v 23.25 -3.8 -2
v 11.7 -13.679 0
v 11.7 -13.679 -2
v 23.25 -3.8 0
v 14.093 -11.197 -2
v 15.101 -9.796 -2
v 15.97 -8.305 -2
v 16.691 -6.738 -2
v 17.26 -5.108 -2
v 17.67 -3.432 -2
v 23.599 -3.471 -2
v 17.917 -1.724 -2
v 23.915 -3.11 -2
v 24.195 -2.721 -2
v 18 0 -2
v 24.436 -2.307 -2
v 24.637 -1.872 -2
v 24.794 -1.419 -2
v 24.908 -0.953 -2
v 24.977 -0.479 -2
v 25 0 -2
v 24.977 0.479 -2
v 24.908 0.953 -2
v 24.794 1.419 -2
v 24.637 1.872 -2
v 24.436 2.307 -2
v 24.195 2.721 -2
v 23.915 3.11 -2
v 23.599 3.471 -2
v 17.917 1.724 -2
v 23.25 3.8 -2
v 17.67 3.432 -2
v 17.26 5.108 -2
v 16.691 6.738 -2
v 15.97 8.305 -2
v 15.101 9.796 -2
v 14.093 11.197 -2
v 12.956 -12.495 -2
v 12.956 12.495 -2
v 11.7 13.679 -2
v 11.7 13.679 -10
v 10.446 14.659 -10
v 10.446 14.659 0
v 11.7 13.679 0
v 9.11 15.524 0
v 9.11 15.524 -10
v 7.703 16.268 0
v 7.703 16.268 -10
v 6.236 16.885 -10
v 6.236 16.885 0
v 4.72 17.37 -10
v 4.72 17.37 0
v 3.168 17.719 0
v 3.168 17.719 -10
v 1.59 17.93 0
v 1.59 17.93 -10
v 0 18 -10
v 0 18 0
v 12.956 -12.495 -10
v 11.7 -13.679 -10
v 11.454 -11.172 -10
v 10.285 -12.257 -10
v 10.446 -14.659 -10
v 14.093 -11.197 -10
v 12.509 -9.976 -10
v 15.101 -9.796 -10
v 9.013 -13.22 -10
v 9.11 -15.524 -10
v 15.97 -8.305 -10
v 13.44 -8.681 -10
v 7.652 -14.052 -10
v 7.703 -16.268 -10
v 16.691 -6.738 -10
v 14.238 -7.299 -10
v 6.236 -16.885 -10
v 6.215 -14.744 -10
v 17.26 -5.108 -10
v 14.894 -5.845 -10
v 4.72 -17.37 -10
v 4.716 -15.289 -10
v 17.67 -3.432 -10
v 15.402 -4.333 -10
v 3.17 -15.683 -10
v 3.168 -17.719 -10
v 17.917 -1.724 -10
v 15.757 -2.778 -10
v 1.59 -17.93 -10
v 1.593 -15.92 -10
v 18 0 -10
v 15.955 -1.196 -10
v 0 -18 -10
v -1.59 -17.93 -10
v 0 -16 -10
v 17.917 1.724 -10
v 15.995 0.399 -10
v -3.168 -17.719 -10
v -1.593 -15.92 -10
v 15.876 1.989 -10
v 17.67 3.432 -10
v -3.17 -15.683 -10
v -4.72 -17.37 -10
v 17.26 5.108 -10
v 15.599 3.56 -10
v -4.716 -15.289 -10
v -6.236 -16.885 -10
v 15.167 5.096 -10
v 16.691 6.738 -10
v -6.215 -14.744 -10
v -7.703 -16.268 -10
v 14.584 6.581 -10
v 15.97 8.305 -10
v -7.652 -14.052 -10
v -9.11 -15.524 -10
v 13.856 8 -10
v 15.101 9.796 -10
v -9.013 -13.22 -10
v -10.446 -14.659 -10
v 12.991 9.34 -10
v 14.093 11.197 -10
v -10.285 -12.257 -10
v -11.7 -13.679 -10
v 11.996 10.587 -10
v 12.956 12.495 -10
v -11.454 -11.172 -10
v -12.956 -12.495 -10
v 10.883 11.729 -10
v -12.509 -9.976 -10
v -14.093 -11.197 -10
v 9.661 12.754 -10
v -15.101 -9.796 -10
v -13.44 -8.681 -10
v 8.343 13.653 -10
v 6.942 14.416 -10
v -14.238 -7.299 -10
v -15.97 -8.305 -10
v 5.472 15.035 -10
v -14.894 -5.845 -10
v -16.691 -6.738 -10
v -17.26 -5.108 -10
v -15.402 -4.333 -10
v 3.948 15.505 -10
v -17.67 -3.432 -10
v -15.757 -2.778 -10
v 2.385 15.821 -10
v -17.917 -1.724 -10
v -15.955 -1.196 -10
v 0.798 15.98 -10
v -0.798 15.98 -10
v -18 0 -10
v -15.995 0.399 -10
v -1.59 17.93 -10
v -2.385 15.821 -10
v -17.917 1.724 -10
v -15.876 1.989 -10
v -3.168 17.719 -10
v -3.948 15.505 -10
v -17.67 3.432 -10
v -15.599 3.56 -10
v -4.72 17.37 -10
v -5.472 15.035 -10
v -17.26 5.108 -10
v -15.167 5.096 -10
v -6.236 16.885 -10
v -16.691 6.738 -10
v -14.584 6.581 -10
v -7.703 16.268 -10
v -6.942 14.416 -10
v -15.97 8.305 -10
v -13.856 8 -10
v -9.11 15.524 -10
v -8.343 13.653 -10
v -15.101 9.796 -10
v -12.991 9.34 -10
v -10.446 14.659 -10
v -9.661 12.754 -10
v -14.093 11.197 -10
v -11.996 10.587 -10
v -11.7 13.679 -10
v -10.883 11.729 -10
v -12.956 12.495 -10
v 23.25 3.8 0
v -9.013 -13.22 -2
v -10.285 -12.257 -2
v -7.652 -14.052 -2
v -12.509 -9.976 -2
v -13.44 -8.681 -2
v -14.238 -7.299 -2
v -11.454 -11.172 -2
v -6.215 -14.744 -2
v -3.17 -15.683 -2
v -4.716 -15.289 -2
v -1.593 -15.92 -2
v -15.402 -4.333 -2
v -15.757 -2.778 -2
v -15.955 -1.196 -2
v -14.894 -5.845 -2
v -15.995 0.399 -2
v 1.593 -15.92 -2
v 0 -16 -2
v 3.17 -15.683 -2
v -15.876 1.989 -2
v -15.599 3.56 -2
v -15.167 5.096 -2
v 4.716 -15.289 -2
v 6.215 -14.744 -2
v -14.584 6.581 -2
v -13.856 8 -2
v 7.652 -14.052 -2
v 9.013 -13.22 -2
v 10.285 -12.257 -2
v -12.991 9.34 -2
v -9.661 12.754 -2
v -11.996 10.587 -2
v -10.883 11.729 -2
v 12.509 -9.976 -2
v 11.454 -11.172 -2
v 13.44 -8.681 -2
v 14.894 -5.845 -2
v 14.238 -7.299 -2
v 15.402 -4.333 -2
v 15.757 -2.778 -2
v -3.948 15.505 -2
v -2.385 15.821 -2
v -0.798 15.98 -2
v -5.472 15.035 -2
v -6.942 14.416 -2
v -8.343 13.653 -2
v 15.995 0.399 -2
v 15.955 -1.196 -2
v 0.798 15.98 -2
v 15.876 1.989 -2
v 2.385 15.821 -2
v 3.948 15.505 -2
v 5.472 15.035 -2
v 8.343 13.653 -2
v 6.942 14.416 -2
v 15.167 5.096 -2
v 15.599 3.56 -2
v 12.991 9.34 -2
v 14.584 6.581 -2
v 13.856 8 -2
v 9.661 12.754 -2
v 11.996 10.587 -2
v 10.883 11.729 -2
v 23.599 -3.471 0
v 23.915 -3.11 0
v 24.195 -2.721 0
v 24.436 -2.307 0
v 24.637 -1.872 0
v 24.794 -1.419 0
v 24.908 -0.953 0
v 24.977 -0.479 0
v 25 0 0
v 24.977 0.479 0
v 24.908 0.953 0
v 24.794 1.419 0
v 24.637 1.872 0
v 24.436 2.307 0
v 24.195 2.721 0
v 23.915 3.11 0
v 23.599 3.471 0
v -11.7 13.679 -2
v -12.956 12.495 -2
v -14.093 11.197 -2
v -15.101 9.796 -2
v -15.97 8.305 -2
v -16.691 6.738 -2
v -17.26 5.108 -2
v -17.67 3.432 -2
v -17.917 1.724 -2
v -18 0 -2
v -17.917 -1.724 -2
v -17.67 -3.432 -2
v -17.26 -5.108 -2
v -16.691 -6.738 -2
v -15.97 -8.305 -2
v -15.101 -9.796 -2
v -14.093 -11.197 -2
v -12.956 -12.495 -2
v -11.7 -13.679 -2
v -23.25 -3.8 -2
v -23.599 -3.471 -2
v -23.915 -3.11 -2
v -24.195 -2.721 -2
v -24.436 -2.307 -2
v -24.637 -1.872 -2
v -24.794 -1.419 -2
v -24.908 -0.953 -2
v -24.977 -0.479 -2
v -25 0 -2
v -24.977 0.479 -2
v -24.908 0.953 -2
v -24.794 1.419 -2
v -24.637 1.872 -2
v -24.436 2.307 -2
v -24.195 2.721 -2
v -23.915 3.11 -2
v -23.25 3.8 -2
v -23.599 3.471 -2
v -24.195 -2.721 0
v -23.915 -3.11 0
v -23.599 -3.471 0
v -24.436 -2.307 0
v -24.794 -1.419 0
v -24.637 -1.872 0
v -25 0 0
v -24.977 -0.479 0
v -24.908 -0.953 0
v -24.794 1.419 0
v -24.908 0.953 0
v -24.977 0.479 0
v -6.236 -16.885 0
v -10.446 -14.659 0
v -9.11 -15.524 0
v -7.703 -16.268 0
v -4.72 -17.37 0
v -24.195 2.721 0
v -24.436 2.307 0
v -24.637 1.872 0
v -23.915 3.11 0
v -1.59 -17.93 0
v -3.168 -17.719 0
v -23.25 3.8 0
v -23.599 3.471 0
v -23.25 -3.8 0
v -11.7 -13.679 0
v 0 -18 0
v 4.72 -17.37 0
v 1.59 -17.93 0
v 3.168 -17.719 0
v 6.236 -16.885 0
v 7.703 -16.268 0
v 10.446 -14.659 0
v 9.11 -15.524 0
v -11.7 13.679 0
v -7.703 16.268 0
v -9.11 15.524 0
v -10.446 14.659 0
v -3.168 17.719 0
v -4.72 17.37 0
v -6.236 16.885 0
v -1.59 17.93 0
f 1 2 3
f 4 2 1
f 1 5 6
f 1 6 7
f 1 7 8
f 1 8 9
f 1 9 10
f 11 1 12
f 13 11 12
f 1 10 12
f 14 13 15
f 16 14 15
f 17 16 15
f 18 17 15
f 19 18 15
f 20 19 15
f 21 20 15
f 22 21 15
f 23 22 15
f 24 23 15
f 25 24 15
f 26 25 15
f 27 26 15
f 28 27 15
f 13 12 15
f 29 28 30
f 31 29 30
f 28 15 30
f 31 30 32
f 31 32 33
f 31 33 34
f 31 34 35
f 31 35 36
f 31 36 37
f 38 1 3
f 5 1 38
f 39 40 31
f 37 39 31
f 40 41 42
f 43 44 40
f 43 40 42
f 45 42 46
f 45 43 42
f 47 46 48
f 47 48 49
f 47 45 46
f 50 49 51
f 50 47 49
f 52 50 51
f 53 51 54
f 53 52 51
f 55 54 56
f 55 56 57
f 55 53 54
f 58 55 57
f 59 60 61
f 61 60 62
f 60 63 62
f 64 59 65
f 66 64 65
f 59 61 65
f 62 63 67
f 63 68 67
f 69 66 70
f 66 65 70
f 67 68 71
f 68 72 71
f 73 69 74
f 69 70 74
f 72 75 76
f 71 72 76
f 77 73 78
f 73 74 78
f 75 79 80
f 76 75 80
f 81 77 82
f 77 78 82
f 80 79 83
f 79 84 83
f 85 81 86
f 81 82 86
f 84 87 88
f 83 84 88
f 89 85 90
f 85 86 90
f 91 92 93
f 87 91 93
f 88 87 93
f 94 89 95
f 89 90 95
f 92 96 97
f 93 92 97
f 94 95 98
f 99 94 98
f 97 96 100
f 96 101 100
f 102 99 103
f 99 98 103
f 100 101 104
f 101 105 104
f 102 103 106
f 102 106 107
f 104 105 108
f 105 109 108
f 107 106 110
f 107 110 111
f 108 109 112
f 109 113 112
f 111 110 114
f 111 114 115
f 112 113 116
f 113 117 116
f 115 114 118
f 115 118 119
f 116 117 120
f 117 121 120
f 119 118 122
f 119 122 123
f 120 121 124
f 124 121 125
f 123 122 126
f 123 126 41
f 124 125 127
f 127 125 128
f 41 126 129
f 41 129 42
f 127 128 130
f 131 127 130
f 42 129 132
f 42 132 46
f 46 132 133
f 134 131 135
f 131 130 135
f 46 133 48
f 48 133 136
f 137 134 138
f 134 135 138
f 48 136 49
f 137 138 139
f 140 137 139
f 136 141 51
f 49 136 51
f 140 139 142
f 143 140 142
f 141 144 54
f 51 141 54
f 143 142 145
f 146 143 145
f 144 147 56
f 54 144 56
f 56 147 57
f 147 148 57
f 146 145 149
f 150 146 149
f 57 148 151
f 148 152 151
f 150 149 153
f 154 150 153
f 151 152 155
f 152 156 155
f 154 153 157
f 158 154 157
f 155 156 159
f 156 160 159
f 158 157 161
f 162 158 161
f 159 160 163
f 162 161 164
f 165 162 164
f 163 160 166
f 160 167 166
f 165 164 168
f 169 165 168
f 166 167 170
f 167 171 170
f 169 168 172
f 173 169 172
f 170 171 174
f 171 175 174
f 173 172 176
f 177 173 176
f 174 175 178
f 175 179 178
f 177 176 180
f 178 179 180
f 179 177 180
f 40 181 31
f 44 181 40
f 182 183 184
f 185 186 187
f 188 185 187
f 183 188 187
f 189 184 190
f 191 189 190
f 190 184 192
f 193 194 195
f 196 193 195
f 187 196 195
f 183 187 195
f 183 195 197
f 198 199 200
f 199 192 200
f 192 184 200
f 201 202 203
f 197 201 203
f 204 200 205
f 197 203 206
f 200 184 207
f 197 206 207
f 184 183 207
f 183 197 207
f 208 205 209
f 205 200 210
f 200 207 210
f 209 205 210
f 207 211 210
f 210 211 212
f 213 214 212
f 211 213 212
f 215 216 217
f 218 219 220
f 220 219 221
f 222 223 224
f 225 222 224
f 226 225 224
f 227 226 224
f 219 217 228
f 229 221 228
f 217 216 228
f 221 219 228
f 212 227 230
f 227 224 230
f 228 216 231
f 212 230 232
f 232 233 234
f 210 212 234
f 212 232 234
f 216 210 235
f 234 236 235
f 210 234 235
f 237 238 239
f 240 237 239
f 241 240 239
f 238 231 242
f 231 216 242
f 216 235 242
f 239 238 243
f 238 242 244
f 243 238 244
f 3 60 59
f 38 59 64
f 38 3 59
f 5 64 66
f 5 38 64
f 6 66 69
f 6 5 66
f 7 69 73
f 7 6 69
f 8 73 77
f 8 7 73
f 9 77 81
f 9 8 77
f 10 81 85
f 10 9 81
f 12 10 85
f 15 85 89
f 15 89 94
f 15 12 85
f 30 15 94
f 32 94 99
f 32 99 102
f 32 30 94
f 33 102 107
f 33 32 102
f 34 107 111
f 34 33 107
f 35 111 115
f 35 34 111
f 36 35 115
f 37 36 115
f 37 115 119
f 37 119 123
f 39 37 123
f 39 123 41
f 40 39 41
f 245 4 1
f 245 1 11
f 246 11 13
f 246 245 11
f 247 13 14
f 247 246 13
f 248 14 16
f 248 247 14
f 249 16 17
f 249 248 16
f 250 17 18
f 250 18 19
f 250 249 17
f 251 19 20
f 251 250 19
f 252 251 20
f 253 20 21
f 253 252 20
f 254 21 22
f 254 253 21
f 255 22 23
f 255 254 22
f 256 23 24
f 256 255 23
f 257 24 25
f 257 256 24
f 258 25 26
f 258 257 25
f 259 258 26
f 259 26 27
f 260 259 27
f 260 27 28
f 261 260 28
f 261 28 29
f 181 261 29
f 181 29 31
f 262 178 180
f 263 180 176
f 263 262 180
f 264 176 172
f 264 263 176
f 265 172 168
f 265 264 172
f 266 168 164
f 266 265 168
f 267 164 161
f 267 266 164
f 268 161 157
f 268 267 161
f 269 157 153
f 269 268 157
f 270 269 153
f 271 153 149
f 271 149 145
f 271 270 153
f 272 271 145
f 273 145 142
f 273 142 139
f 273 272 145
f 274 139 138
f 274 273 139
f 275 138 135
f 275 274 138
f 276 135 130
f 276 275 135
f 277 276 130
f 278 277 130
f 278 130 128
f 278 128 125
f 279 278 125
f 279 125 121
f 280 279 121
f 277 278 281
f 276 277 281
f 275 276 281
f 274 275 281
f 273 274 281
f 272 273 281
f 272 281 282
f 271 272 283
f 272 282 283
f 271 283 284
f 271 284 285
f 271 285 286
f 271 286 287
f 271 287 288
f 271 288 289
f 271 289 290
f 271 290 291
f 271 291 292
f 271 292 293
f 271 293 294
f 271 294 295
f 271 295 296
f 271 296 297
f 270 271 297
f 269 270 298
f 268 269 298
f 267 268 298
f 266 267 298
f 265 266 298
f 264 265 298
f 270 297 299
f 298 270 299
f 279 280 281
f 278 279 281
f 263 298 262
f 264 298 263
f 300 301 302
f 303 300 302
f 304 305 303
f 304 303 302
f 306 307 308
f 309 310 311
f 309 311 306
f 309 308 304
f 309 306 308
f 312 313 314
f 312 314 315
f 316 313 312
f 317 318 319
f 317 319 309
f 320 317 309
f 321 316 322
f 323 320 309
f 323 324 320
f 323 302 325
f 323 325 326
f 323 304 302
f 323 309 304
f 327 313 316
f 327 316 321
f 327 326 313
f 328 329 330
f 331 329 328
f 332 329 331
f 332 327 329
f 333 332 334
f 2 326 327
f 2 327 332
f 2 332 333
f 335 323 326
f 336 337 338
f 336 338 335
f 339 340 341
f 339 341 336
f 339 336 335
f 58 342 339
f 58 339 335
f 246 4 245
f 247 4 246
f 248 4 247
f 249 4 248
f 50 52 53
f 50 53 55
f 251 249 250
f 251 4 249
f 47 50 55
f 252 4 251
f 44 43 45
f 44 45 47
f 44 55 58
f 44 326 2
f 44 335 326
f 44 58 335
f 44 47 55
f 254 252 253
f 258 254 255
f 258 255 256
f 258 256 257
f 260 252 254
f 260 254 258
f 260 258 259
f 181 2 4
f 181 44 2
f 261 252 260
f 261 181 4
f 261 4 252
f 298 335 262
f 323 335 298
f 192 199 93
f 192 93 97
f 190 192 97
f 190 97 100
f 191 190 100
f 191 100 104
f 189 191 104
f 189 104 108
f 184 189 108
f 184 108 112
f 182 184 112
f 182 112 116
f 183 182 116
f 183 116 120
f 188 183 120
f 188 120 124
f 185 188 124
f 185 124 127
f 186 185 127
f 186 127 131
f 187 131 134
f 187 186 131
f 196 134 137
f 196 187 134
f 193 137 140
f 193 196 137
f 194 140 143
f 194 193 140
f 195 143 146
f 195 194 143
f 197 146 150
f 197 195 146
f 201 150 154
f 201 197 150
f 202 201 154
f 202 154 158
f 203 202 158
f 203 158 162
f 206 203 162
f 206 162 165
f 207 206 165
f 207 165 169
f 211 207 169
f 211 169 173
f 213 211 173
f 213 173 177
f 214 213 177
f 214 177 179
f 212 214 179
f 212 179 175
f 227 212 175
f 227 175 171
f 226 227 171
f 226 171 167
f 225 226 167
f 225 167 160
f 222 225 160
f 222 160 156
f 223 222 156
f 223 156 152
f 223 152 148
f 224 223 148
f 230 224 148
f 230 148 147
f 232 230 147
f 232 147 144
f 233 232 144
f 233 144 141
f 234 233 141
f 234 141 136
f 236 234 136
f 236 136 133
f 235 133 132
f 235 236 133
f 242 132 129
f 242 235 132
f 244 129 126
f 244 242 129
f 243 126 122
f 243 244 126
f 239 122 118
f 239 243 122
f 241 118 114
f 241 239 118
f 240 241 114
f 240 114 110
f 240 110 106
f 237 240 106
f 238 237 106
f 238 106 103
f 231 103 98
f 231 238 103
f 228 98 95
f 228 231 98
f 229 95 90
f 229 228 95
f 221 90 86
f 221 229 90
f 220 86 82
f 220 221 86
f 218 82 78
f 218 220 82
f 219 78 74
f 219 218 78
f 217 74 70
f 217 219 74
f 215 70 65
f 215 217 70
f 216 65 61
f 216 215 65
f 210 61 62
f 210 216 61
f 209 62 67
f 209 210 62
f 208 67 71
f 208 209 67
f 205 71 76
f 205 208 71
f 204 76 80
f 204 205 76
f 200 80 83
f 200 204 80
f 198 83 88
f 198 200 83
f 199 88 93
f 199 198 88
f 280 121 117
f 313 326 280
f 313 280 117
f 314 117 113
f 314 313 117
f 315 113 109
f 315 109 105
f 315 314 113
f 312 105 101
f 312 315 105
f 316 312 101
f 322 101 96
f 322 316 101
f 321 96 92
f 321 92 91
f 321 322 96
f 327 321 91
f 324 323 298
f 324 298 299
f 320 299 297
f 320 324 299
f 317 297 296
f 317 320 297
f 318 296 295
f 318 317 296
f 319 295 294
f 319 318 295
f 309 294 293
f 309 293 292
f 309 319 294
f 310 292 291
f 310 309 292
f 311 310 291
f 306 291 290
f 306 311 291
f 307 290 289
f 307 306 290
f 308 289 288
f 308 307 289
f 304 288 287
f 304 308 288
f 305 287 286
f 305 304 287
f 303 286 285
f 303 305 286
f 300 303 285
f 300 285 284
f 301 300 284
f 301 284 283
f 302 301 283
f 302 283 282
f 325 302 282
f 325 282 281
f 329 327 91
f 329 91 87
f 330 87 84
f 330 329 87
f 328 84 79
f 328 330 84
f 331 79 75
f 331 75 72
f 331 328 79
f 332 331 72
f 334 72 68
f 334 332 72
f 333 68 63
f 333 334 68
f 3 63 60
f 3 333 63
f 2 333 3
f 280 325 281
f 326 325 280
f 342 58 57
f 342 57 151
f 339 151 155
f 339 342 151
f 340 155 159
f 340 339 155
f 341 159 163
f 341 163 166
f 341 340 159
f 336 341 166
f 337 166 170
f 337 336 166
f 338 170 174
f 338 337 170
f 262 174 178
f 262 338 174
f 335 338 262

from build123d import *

# Parameters (mm, degrees)
BOSS_EXTRUDE1_DEPTH   = 2
BOSS_EXTRUDE1_2_DEPTH = 2
SKETCH1_3_R           = 18
SKETCH1_3_R_2         = 16
BOSS_EXTRUDE2_DEPTH   = 10
SKETCH1_4_R           = 16
BOSS_EXTRUDE3_DEPTH   = 2


with BuildPart() as part:
    # Sketch1 → Boss-Extrude1 (new body)
    with BuildSketch(Plane(origin=(0, 0, 0), x_dir=(0, 1, 0), z_dir=(0, 0, 1))):
        with BuildLine():
            ThreePointArc((3.799671038, 23.25), (0, 25), (-3.799671038, 23.25))
            Line((-3.799671038, 23.25), (-13.678815738, 11.7))
            ThreePointArc((-13.678815738, 11.7), (0, 18), (13.678815738, 11.7))
            Line((13.678815738, 11.7), (3.799671038, 23.25))
        make_face()
    extrude(amount=-BOSS_EXTRUDE1_DEPTH)



with BuildPart() as body_2:
    # Sketch1 → Boss-Extrude1 2 (new body)
    with BuildSketch(Plane(origin=(0, 0, 0), x_dir=(0, 1, 0), z_dir=(0, 0, 1))):
        with BuildLine():
            ThreePointArc((13.678815738, -11.7), (0, -18), (-13.678815738, -11.7))
            Line((-13.678815738, -11.7), (-3.799671038, -23.25))
            ThreePointArc((-3.799671038, -23.25), (0, -25), (3.799671038, -23.25))
            Line((3.799671038, -23.25), (13.678815738, -11.7))
        make_face()
    extrude(amount=-BOSS_EXTRUDE1_2_DEPTH)


with BuildPart() as part_1:
    add(part.part)

    add(body_2.part)  # Boss-Extrude2 merges body 2
    # Sketch1<3> → Boss-Extrude2 (add)
    with BuildSketch(Plane(origin=(0, 0, 0), x_dir=(0, 1, 0), z_dir=(0, 0, 1))):
        Circle(SKETCH1_3_R)
        Circle(SKETCH1_3_R_2, mode=Mode.SUBTRACT)
    extrude(amount=-BOSS_EXTRUDE2_DEPTH)

    # Sketch1<4> → Boss-Extrude3 (add)
    with BuildSketch(Plane(origin=(0, 0, 0), x_dir=(0, 1, 0), z_dir=(0, 0, 1))):
        Circle(SKETCH1_4_R)
    extrude(amount=-BOSS_EXTRUDE3_DEPTH)


solid = part_1.part
